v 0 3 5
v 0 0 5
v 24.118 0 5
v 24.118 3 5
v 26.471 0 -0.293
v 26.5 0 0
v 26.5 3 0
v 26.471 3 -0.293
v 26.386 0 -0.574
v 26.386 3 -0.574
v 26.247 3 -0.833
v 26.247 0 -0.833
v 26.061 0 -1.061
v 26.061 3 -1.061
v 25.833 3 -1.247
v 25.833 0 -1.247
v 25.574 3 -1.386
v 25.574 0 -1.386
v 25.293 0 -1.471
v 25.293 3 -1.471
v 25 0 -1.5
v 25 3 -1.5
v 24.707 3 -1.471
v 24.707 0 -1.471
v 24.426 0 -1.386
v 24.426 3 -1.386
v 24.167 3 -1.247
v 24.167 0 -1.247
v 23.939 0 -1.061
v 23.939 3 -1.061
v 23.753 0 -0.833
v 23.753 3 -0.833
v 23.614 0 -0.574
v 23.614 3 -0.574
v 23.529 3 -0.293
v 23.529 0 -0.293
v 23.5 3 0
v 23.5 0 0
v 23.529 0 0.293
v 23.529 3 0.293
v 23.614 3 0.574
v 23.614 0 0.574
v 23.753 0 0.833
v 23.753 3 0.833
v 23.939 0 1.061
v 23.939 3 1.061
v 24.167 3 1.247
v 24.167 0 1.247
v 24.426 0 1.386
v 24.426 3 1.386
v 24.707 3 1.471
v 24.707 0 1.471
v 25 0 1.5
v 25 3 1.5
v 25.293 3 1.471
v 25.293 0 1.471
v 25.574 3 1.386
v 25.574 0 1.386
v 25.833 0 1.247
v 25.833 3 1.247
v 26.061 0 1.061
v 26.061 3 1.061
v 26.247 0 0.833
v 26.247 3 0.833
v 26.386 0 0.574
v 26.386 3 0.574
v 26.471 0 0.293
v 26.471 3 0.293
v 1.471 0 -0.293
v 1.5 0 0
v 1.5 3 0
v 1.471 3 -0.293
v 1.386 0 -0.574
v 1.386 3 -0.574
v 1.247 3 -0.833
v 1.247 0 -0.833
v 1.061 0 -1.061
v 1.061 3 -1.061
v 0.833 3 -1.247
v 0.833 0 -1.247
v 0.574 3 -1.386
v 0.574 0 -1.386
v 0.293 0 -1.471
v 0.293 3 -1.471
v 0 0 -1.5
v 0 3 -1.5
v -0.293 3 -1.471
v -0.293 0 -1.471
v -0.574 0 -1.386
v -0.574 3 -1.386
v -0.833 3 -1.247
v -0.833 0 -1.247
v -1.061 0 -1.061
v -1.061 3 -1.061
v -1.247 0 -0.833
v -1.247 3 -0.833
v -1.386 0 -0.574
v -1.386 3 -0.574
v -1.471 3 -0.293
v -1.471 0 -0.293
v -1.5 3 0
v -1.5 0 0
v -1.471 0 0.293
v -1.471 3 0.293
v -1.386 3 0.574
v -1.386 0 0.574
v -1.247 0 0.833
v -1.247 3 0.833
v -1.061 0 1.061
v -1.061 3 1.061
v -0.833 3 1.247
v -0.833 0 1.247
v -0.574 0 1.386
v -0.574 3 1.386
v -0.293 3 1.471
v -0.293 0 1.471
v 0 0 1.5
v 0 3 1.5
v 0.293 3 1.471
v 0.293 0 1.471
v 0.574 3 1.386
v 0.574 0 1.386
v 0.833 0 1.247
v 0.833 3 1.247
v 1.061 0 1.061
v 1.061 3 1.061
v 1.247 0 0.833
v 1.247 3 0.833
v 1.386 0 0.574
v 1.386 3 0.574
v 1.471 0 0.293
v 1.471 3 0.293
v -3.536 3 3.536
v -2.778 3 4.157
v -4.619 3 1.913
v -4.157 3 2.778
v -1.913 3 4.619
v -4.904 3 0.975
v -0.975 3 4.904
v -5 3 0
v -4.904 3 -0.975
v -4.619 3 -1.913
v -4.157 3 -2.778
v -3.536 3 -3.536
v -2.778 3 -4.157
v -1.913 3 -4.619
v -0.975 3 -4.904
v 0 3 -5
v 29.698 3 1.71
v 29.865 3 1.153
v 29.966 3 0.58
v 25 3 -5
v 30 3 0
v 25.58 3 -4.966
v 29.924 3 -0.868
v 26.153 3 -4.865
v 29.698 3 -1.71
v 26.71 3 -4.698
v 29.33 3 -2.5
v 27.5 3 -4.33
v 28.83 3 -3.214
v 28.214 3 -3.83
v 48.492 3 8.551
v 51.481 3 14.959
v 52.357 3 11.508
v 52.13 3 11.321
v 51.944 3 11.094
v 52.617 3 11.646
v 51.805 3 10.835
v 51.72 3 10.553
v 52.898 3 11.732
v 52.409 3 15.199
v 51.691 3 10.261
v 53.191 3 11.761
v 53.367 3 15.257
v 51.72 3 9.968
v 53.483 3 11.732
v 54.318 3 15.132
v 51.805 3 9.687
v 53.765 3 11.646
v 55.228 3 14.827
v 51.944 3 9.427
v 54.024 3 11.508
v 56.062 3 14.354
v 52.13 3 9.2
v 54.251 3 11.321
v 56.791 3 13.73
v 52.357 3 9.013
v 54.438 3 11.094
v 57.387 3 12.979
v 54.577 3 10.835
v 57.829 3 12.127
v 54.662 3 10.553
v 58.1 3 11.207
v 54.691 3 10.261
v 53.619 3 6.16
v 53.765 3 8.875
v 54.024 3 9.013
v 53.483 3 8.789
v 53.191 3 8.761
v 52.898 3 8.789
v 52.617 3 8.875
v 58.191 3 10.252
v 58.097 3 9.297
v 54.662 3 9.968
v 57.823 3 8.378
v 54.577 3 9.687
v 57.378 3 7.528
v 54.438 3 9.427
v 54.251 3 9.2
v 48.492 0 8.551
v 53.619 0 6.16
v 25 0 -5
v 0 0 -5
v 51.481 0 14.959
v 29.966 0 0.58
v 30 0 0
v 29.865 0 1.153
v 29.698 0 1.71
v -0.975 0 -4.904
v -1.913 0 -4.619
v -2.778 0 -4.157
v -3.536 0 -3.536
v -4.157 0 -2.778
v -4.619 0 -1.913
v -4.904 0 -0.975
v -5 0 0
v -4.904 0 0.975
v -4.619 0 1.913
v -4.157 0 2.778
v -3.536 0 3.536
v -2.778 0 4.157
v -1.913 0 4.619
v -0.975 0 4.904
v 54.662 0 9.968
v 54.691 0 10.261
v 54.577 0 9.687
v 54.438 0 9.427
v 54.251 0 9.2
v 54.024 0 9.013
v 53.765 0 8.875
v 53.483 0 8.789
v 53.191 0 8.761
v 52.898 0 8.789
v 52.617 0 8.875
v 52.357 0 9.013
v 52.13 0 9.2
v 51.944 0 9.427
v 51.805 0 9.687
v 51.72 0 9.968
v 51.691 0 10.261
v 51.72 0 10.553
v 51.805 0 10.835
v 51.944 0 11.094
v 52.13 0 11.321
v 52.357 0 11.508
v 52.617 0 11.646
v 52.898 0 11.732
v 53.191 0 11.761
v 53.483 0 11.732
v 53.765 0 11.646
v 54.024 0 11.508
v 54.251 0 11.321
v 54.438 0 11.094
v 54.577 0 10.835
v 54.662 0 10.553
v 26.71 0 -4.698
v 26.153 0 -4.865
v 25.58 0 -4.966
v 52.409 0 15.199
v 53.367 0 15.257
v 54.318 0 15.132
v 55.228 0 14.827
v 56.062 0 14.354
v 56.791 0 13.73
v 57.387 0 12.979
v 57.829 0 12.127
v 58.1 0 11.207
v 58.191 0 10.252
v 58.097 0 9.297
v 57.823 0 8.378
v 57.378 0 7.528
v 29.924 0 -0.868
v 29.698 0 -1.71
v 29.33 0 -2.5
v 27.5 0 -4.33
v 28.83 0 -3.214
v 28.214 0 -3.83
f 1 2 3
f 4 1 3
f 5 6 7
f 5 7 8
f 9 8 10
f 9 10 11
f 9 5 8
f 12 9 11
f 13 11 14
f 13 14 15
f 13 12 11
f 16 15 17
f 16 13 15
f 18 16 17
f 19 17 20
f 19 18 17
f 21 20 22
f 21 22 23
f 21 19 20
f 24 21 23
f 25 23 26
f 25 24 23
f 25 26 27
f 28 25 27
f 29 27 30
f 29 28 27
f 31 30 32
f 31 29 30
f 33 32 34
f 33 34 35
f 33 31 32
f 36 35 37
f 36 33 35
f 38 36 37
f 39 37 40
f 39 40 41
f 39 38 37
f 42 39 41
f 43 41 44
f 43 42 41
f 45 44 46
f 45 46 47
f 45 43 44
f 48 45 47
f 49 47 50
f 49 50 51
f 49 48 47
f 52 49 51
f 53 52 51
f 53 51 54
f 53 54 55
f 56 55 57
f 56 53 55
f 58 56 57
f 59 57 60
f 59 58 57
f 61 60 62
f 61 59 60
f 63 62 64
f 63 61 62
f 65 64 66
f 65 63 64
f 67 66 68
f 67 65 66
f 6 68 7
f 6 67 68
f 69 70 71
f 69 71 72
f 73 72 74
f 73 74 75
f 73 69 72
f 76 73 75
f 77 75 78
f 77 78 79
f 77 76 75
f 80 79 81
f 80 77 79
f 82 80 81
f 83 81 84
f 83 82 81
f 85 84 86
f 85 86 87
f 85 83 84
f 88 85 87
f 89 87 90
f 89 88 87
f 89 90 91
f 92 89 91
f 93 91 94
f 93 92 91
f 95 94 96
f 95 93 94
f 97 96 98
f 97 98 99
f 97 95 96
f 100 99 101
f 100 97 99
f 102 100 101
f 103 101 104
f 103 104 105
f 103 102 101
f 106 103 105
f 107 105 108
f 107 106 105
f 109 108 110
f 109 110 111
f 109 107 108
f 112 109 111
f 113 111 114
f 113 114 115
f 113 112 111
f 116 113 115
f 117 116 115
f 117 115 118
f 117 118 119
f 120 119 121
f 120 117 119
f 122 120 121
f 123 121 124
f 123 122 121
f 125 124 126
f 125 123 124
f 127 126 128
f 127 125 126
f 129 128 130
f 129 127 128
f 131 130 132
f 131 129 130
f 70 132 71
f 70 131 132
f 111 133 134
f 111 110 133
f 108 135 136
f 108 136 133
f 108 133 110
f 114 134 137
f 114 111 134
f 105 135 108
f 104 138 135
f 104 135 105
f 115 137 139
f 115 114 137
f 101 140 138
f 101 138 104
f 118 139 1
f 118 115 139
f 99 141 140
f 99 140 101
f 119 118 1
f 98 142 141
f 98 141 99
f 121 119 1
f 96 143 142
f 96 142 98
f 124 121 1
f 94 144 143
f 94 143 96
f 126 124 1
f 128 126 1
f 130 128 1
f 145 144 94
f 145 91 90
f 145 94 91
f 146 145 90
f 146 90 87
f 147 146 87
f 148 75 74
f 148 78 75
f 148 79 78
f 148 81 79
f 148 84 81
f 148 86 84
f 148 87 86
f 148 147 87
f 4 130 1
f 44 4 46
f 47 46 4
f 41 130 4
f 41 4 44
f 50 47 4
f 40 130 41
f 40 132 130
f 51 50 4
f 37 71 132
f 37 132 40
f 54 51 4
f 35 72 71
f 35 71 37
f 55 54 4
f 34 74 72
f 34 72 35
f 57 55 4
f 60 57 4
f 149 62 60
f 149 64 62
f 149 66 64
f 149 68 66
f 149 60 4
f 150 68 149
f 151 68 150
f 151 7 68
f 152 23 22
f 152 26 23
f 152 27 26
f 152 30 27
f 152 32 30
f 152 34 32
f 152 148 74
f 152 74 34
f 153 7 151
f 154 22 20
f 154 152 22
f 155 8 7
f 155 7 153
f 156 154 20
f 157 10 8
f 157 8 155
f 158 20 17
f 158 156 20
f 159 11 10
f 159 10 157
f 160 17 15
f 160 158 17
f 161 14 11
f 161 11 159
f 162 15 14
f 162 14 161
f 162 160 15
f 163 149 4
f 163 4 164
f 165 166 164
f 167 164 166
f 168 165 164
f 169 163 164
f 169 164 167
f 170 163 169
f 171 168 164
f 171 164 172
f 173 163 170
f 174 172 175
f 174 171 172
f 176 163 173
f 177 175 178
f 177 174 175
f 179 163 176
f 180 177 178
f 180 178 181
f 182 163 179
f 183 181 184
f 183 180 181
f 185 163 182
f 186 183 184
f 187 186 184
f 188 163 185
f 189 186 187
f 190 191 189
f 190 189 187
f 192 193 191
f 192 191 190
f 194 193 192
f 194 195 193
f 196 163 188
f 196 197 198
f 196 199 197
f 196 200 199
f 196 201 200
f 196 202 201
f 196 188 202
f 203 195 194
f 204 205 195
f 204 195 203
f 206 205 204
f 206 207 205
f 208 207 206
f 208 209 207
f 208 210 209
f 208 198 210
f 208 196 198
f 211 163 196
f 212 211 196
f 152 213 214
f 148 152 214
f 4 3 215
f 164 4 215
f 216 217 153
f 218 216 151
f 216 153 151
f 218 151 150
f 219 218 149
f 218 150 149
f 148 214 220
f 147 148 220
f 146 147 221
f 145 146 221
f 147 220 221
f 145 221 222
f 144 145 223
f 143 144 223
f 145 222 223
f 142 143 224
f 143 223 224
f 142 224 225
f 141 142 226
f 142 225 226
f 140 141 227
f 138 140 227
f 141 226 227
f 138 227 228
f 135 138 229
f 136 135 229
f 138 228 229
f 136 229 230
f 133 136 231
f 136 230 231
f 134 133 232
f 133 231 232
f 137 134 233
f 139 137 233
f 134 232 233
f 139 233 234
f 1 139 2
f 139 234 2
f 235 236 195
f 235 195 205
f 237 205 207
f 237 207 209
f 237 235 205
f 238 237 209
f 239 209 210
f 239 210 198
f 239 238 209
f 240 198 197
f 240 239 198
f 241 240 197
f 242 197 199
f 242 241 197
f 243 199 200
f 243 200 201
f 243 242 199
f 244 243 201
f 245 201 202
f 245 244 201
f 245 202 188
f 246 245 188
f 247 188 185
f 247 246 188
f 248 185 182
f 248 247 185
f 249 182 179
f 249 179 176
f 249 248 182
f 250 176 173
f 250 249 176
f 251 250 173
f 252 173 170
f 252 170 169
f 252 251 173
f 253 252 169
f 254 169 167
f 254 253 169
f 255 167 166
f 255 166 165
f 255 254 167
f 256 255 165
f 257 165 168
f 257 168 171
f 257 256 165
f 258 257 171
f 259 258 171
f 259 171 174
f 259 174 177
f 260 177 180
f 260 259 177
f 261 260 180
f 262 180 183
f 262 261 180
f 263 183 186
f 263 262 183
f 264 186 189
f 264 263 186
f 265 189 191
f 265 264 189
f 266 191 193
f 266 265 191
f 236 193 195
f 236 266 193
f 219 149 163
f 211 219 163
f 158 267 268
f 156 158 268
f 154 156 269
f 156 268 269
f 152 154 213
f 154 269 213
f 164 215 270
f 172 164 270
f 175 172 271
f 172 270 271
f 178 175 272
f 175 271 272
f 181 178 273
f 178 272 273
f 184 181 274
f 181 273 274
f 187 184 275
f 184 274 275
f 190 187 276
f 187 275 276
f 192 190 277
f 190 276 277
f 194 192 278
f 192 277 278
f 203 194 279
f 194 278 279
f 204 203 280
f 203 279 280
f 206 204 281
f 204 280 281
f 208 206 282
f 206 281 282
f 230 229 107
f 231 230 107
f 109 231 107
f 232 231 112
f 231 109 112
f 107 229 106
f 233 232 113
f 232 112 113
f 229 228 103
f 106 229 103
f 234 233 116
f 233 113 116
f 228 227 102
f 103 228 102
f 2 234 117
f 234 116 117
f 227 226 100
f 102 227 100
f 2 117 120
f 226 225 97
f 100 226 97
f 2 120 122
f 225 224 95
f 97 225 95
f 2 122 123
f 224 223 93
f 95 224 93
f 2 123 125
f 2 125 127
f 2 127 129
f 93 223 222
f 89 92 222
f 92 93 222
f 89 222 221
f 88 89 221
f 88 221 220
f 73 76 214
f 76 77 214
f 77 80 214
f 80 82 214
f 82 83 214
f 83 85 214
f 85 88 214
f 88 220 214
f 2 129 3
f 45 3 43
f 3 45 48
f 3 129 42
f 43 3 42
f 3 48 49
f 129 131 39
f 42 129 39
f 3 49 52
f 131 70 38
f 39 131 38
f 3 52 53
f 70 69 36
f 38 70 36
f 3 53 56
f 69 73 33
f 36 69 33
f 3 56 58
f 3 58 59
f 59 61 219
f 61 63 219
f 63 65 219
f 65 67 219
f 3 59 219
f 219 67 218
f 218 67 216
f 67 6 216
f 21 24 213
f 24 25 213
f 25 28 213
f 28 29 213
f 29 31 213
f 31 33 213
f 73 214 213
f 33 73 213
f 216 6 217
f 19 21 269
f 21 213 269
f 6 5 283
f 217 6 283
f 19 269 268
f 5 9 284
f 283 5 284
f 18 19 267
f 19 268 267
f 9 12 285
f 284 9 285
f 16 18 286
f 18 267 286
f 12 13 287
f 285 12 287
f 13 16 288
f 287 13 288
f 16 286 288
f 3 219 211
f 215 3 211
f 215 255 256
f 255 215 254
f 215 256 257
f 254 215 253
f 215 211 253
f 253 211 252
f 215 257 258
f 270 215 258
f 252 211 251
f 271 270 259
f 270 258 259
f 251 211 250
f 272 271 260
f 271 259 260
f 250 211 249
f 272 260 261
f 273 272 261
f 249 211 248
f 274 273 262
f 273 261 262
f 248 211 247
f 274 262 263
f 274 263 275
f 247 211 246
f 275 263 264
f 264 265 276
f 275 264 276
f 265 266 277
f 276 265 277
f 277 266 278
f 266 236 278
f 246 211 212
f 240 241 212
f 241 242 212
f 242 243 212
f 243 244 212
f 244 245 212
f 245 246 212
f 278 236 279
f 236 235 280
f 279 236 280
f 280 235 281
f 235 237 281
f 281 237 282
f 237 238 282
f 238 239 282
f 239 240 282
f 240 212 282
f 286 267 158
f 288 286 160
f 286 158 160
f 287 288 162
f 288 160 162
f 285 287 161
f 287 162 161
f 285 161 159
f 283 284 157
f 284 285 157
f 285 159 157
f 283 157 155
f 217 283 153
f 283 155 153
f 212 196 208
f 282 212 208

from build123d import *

# Parameters (mm, degrees)
SKETCH1_R           = 1.5
BOSS_EXTRUDE1_DEPTH = 3
CUT_EXTRUDE1_DEPTH  = 10


with BuildPart() as part:
    # Sketch1 → Boss-Extrude1 (new body)
    with BuildSketch(Plane(origin=(0, 0, 0), x_dir=(1, 0, 0), z_dir=(0, 1, 0))):
        with BuildLine():
            Line((25, 5), (0, 5))
            ThreePointArc((0, 5), (-5, 0), (0, -5))
            Line((0, -5), (24.118365096, -5))
            Line((24.118365096, -5), (51.480677907, -14.959067404))
            ThreePointArc((51.480677907, -14.959067404), (57.889241728, -11.970705016), (54.90087934, -5.562141196))
            Line((54.90087934, -5.562141196), (26.710100717, 4.698463104))
            ThreePointArc((26.710100717, 4.698463104), (25.868240888, 4.924038765), (25, 5))
        make_face()
        Circle(SKETCH1_R, mode=Mode.SUBTRACT)
        with Locations((25, 0)):
            Circle(SKETCH1_R, mode=Mode.SUBTRACT)
        with Locations((53.190778624, -10.2606043)):
            Circle(SKETCH1_R, mode=Mode.SUBTRACT)
    extrude(amount=BOSS_EXTRUDE1_DEPTH)

    # Sketch2 → Cut-Extrude1 (cut)
    with BuildSketch(Plane(origin=(0, 3, 0), x_dir=(1, 0, 0), z_dir=(0, 1, 0))):
        with BuildLine():
            Line((53.619166576, -6.159813673), (57.377937059, -7.527894247))
            ThreePointArc((57.377937059, -7.527894247), (56.298907102, -6.344032156), (54.90087934, -5.562141196))
            Line((54.90087934, -5.562141196), (26.710100717, 4.698463104))
            ThreePointArc((26.710100717, 4.698463104), (29.095760221, 2.867882182), (30, 0))
            ThreePointArc((30, 0), (29.924038765, -0.868240888), (29.698463104, -1.710100717))
            Line((29.698463104, -1.710100717), (48.49231552, -8.550503583))
            Line((48.49231552, -8.550503583), (53.619166576, -6.159813673))
        make_face()
    extrude(amount=-CUT_EXTRUDE1_DEPTH, mode=Mode.SUBTRACT)


solid = part.part
